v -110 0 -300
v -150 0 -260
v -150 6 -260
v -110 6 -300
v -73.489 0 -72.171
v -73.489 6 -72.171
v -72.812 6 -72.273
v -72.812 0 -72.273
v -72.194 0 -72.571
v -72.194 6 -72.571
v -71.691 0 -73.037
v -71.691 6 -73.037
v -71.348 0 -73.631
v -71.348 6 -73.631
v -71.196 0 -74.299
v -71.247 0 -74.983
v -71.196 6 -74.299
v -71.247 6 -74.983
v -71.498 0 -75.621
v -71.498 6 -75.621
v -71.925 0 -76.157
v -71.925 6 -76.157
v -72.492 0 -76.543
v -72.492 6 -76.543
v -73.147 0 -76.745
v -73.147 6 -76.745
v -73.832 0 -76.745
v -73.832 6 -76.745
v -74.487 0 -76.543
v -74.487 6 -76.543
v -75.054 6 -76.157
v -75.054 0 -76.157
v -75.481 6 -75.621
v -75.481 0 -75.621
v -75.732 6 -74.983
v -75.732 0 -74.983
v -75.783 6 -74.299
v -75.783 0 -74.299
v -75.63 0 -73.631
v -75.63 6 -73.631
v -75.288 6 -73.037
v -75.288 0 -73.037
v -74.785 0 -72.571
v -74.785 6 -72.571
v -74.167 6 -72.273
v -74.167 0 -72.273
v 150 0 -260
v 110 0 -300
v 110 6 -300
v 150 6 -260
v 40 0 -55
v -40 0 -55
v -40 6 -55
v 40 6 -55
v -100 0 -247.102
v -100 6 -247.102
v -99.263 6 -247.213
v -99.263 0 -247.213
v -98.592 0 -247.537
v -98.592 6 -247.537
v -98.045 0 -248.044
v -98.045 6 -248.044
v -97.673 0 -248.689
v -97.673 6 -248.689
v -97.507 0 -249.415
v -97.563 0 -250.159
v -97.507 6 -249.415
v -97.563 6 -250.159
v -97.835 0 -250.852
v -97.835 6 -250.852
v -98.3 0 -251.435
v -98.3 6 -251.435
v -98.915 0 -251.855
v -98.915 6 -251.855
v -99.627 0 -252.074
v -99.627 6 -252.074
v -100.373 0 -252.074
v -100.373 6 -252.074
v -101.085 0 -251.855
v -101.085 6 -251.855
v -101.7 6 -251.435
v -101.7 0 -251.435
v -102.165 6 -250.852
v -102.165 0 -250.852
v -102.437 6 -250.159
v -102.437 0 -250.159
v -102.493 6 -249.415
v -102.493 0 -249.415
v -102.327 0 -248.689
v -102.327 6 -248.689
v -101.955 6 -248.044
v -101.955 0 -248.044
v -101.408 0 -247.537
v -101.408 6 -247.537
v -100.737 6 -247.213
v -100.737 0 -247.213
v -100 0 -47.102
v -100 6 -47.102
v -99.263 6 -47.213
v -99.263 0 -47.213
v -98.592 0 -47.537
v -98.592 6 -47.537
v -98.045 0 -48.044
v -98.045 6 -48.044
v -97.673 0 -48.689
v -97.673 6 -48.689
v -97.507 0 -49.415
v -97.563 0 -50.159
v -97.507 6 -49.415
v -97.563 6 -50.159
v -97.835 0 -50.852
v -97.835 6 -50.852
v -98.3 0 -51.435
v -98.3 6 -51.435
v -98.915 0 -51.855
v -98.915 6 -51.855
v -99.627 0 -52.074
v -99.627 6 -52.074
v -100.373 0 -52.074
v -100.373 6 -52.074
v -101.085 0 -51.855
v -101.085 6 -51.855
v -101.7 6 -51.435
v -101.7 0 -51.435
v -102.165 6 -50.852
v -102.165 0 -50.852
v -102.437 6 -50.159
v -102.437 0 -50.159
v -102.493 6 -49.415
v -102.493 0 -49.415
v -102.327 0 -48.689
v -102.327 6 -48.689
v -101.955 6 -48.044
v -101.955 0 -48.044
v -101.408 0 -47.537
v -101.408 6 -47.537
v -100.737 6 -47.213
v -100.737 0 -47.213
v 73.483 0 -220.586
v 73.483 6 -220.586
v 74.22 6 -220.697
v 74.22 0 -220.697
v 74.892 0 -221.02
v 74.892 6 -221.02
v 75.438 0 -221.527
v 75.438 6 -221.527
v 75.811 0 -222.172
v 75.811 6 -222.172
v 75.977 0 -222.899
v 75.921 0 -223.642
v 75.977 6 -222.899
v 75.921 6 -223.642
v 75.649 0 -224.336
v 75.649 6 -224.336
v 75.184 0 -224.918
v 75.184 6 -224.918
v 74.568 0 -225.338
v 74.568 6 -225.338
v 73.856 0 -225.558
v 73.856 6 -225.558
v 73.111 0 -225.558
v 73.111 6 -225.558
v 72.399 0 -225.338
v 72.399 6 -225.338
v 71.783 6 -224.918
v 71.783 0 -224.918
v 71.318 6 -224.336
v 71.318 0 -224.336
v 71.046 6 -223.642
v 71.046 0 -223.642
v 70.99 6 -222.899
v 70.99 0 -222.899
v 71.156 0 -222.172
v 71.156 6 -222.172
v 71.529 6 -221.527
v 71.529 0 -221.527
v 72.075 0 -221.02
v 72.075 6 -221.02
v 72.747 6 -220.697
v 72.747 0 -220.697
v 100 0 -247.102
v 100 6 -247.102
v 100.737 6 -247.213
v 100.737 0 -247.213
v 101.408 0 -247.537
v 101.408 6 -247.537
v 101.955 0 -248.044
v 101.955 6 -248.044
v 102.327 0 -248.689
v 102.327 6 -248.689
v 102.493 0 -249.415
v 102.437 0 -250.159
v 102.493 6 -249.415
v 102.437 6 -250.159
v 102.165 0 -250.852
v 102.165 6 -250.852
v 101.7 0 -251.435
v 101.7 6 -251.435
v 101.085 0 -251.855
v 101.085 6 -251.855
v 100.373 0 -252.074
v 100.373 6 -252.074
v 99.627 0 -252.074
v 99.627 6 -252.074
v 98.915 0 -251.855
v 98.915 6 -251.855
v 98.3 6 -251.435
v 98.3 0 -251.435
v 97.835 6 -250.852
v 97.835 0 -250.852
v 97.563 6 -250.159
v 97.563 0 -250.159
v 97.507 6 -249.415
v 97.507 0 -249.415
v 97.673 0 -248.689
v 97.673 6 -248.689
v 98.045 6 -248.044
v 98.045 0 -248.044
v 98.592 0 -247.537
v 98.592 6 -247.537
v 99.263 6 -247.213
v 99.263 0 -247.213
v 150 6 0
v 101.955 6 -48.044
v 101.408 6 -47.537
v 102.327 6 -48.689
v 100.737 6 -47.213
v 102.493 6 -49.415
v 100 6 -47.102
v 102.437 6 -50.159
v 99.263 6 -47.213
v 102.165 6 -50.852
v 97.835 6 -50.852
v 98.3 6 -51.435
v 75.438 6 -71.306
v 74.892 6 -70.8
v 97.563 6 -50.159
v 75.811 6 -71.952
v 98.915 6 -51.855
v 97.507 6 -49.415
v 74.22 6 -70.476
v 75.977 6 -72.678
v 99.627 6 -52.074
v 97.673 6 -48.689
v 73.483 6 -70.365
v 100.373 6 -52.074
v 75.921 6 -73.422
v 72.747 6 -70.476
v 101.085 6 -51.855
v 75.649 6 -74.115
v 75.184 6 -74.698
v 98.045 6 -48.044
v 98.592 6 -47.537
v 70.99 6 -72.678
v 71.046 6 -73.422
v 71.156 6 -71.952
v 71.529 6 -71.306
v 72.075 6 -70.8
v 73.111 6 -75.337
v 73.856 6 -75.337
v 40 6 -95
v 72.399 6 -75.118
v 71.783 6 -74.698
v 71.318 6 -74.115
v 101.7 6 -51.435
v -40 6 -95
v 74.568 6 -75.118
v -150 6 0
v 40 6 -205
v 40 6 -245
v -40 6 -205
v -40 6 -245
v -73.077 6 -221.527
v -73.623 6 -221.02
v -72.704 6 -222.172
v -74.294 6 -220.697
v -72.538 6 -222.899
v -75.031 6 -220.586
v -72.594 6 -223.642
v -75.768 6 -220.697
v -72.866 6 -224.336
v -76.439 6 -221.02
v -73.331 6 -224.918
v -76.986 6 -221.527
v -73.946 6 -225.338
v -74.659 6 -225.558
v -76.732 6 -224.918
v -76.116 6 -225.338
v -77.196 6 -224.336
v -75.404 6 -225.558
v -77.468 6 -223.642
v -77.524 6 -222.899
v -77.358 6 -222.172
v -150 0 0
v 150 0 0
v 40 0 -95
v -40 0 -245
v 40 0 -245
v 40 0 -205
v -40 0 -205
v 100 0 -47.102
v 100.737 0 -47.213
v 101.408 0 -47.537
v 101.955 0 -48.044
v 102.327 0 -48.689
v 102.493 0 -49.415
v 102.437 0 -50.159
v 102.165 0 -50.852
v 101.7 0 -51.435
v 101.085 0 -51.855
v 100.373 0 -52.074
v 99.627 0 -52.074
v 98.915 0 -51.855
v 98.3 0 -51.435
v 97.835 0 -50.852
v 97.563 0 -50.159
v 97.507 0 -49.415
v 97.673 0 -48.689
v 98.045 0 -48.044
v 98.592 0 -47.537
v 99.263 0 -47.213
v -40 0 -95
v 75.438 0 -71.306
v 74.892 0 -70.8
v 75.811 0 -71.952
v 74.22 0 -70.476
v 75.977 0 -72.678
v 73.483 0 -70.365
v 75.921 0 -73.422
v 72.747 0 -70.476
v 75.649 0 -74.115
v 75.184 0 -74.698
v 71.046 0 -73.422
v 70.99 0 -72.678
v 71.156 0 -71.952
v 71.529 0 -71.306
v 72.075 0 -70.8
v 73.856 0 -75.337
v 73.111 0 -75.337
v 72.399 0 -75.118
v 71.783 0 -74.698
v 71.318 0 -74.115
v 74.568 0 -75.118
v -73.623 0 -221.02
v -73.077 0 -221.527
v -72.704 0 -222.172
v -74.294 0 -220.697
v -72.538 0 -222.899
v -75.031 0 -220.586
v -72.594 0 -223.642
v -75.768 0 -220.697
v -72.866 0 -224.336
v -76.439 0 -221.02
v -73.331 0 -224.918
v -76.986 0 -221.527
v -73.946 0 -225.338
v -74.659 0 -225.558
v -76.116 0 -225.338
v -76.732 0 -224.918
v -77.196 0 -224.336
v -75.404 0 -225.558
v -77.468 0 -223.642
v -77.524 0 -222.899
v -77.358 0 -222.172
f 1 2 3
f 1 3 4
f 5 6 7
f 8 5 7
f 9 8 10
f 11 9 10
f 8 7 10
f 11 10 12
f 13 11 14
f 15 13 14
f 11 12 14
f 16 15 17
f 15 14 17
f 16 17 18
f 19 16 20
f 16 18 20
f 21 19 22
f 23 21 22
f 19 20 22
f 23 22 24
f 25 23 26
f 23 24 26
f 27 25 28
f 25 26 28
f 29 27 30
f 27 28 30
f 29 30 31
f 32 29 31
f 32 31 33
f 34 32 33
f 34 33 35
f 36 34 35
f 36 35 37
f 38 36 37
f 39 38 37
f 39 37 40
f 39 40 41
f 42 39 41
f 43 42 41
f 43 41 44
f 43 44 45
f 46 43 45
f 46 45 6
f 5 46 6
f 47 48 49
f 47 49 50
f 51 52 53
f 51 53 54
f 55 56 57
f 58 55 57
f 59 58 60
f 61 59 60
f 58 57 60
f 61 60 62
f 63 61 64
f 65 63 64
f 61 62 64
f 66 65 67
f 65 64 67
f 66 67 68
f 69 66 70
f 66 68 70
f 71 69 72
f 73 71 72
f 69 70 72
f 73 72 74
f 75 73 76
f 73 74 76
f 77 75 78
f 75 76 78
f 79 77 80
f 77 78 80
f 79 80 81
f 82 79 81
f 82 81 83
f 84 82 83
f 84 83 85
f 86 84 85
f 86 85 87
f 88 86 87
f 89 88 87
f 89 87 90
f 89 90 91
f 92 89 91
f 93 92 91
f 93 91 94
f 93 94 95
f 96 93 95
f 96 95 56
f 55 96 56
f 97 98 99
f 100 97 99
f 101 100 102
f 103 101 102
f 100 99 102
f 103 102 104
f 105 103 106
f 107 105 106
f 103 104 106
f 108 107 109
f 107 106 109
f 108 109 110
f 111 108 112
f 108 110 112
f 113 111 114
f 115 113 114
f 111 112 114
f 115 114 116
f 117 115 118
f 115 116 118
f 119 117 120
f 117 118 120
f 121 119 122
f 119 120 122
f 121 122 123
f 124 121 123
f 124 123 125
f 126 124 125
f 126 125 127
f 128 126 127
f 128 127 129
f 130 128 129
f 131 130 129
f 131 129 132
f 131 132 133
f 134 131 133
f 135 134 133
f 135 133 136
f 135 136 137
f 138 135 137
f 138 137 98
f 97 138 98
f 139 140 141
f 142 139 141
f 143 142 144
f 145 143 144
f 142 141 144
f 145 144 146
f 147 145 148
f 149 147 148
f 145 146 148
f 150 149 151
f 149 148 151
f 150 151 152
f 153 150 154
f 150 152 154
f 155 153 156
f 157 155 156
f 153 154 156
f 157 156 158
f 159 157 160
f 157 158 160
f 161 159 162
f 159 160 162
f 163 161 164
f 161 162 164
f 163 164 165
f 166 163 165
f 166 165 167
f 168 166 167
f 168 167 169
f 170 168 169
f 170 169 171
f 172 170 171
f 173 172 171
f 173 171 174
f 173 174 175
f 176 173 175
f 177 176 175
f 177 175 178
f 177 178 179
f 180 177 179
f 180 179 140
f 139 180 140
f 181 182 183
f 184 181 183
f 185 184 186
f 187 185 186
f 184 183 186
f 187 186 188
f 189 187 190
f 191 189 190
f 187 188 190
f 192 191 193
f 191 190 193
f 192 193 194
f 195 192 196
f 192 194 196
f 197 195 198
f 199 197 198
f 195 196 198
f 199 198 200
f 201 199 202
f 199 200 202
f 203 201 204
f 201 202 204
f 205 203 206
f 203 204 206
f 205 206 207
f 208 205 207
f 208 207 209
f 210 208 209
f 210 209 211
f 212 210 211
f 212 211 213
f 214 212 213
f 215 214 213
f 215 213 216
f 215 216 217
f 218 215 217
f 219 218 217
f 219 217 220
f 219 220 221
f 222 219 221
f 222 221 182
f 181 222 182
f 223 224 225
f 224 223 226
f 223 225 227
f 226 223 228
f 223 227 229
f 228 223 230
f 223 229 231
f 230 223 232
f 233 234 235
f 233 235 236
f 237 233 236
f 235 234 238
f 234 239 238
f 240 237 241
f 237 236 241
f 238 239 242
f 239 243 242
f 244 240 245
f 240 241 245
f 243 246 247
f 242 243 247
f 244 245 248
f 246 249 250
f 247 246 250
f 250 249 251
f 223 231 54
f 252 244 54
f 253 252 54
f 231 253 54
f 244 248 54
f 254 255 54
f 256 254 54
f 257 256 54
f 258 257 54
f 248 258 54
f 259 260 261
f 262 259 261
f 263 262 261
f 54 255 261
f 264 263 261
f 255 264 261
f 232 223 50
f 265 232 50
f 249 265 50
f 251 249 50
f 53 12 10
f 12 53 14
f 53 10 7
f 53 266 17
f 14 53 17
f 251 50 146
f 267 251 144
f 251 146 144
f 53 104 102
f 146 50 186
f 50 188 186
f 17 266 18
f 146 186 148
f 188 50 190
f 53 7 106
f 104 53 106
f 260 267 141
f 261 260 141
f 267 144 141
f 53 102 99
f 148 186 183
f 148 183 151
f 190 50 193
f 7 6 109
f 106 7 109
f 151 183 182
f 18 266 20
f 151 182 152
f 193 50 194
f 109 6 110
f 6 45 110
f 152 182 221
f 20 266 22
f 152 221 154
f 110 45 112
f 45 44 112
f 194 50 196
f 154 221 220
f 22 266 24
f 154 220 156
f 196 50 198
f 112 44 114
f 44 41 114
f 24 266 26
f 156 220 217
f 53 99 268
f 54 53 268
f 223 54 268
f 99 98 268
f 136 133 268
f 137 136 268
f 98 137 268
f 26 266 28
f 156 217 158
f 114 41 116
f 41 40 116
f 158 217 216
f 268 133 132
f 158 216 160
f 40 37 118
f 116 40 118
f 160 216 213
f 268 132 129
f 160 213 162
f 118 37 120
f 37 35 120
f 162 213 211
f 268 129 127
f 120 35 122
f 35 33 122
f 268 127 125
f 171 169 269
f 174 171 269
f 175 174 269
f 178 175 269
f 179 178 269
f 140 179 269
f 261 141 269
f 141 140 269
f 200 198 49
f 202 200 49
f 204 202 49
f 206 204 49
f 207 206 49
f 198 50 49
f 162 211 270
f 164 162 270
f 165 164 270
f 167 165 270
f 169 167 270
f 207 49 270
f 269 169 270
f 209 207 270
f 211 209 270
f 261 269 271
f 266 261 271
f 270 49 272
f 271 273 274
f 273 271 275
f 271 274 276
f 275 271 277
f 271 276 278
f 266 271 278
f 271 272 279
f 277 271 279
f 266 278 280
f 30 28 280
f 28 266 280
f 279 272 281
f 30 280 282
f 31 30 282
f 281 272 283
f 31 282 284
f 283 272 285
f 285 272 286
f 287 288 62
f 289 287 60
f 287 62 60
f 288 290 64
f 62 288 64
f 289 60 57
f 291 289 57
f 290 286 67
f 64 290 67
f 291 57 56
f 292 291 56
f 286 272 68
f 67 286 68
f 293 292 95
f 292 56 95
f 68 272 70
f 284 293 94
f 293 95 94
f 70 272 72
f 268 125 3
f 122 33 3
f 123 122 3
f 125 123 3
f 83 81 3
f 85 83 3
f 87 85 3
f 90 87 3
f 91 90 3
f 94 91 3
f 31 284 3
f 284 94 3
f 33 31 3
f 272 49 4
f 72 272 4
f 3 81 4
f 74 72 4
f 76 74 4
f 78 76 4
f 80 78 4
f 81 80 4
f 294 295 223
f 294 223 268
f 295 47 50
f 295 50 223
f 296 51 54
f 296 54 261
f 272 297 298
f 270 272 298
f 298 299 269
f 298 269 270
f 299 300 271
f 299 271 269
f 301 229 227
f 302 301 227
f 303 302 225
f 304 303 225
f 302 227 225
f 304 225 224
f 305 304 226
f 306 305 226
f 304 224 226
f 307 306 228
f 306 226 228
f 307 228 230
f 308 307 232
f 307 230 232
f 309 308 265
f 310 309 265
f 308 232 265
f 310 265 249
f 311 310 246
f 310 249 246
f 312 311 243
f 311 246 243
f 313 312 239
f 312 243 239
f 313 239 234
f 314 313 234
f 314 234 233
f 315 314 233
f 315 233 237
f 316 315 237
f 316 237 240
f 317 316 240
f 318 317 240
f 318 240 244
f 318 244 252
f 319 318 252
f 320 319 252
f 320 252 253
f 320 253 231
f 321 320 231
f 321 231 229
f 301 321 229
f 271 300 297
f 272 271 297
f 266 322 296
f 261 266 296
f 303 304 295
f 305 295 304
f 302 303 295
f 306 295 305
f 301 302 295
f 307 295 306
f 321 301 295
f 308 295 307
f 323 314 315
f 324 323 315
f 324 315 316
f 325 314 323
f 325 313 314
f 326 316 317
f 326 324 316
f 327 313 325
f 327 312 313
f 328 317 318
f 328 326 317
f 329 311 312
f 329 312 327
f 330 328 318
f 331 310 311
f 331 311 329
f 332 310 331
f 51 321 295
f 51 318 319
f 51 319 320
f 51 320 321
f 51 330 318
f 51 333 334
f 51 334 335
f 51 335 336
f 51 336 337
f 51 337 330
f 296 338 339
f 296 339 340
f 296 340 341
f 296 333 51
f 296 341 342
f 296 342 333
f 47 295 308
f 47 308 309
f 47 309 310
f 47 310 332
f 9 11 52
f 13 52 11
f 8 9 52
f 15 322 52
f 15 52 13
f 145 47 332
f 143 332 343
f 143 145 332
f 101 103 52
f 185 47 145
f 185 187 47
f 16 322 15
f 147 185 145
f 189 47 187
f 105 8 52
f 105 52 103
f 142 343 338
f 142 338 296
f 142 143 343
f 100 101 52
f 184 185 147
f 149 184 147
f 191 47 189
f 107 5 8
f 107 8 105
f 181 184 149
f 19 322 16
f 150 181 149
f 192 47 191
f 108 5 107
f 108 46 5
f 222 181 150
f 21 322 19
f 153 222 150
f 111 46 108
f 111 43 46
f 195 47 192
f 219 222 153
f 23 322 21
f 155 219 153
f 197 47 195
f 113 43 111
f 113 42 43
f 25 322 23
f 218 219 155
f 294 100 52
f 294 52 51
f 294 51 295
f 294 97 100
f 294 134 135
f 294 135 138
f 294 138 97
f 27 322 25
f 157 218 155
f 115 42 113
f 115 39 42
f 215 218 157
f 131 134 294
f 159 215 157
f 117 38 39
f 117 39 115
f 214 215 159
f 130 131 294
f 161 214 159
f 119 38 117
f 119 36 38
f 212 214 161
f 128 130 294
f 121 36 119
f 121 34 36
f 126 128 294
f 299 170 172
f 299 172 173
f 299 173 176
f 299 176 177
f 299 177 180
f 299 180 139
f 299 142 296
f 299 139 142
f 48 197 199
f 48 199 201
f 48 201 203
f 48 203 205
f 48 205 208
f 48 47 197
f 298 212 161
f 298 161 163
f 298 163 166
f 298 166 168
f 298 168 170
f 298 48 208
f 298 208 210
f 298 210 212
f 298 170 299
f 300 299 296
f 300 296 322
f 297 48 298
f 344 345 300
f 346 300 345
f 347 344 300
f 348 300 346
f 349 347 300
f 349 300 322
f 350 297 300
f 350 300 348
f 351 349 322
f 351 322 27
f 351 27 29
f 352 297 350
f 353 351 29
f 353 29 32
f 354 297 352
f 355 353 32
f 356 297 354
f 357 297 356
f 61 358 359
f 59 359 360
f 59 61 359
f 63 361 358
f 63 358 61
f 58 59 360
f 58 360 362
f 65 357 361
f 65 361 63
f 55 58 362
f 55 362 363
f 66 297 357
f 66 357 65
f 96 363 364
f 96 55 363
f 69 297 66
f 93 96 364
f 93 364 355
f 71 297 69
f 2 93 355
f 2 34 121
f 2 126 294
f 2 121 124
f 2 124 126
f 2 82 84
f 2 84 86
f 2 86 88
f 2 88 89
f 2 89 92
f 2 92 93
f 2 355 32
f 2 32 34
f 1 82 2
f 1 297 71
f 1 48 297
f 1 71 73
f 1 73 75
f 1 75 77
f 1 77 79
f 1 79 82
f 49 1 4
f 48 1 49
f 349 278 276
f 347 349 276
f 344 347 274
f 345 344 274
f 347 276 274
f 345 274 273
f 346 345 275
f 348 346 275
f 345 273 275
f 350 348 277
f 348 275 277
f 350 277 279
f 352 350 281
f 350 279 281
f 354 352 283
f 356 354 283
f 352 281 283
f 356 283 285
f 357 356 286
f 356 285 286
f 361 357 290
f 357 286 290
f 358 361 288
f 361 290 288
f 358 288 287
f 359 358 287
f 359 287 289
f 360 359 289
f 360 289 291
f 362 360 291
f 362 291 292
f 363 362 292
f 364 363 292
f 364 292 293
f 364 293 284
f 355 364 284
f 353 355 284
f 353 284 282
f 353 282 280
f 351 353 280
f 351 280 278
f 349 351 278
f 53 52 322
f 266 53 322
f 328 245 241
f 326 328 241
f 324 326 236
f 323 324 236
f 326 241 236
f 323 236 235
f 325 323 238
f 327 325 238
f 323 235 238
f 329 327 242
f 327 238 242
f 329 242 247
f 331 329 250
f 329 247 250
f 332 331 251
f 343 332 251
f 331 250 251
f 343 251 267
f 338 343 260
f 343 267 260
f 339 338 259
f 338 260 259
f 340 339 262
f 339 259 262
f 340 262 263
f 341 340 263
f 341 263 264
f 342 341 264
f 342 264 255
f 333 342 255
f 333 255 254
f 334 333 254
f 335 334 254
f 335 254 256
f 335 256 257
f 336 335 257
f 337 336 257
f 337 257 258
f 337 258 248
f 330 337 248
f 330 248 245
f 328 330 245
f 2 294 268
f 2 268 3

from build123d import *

# Parameters (mm, degrees)
ESQUISSE1_W              = 80
ESQUISSE1_H              = 40
BOSS_EXTRU_1_DEPTH       = 6
ESQUISSE9_R              = 2.5
ESQUISSE9_R_2            = 2.3
ENL_V_MAT_EXTRU_12_DEPTH = 35


with BuildPart() as part:
    # Esquisse1 → Boss.-Extru.1 (new body)
    with BuildSketch(Plane(origin=(0, 0, 0), x_dir=(1, 0, 0), z_dir=(0, 1, 0))):
        Polygon((-150, 0), (-150, 260), (-110, 300), (110, 300), (150, 260), (150, 0), align=None)
        with Locations((0, 75)):
            Rectangle(ESQUISSE1_W, ESQUISSE1_H, mode=Mode.SUBTRACT)
        with Locations((0, 225)):
            Rectangle(ESQUISSE1_W, ESQUISSE1_H, mode=Mode.SUBTRACT)
    extrude(amount=BOSS_EXTRU_1_DEPTH)

    # Esquisse9 → Enlèv. mat.-Extru.12 (cut)
    with BuildSketch(Plane(origin=(0, 6, 0), x_dir=(1, 0, 0), z_dir=(0, 1, 0))):
        with Locations(Location((-100, 249.602322281, 0), (0, 0, 270))):
            Circle(ESQUISSE9_R)
        with Locations(Location((-75.031111773, 223.085817986, 0), (0, 0, 270))):
            Circle(ESQUISSE9_R)
        with Locations(Location((73.483495706, 223.085817986, 0), (0, 0, 270))):
            Circle(ESQUISSE9_R)
        with Locations(Location((100, 249.602322281, 0), (0, 0, 270))):
            Circle(ESQUISSE9_R)
        with Locations(Location((73.483495706, 72.865212221, 0), (0, 0, 270))):
            Circle(ESQUISSE9_R)
        with Locations(Location((100, 49.602322281, 0), (0, 0, 270))):
            Circle(ESQUISSE9_R)
        with Locations(Location((-73.489446443, 74.470995042, 0), (0, 0, 270))):
            Circle(ESQUISSE9_R_2)
        with Locations(Location((-100, 49.602322281, 0), (0, 0, 270))):
            Circle(ESQUISSE9_R)
    extrude(amount=-ENL_V_MAT_EXTRU_12_DEPTH, mode=Mode.SUBTRACT)


solid = part.part
